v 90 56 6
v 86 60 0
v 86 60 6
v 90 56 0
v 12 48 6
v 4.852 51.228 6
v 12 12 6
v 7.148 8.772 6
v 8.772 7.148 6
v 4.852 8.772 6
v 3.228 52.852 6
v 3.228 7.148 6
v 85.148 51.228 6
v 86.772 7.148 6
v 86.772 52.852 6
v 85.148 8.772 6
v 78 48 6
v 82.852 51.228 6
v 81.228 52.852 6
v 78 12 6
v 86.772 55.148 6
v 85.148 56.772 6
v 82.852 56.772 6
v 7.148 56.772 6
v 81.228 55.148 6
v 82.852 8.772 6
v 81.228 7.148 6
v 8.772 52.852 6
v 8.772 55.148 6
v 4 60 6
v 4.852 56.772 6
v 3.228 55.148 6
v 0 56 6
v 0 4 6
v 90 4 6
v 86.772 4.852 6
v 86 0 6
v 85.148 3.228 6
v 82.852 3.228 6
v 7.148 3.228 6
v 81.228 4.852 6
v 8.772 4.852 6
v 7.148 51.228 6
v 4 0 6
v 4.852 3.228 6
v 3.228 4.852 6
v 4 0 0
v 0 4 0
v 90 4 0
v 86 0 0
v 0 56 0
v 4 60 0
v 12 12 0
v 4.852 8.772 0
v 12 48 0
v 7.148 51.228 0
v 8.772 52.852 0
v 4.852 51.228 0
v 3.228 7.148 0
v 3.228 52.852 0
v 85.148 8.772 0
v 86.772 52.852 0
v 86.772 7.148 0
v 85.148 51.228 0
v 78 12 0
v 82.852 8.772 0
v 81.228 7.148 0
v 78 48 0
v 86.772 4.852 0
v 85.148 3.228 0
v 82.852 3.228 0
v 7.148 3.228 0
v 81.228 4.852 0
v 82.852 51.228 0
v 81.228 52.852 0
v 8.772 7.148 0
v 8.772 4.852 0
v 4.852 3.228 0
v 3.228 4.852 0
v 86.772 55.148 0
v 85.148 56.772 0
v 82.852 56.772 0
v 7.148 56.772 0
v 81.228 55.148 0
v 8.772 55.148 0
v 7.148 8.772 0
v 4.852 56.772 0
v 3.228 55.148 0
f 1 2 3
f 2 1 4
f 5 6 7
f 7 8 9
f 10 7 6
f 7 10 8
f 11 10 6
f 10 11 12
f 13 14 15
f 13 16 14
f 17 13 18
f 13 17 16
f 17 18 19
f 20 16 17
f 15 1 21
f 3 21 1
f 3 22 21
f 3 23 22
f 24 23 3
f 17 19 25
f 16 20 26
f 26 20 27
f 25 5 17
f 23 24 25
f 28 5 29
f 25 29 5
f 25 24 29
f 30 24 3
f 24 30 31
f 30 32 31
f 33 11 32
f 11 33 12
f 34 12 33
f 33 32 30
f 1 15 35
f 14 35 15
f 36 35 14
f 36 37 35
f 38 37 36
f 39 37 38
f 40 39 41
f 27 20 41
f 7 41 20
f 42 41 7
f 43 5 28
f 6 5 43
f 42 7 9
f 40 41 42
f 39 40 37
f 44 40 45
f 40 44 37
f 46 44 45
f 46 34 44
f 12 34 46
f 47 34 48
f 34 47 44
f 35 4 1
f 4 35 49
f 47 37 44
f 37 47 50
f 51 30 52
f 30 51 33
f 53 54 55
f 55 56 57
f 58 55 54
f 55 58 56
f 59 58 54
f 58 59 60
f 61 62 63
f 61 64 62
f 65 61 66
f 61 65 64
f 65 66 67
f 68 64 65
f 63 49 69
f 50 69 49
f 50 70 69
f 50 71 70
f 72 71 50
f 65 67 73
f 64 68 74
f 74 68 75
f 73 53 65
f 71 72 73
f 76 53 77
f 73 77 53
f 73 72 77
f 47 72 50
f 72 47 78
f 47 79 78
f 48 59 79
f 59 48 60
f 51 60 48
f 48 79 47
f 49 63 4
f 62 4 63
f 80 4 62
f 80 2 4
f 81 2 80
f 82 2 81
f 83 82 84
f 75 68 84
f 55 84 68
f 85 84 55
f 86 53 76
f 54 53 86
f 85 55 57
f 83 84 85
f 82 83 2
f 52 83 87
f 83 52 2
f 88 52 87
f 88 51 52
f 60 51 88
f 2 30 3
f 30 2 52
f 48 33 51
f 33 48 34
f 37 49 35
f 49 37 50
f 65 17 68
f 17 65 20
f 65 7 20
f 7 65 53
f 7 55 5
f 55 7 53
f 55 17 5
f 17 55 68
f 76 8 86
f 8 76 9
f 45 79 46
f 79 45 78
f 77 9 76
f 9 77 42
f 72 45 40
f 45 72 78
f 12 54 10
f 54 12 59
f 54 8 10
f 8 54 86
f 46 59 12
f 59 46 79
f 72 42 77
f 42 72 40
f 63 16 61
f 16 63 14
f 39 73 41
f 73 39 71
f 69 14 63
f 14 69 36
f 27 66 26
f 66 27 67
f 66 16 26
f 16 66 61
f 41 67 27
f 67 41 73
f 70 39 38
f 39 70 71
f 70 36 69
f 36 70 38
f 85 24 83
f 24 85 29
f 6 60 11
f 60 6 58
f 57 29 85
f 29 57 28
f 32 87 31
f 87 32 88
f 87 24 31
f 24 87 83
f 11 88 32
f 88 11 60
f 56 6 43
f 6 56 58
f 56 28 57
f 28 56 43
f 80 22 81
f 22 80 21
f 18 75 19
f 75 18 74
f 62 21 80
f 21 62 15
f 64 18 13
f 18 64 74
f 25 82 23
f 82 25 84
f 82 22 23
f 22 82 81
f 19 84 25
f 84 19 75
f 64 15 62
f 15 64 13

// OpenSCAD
$fn = 32;

// ----------------------------------------------------------------------
// Frame plate: 90 x 60 frame, 12 mm rails
// ----------------------------------------------------------------------

// --- parameters (mm) ---
plate_l = 90;             // plate length, X
plate_w = 60;             // plate width, Y
plate_t = 6;              // plate thickness, Z (extrusion height)
corner_c = 4;             // corner chamfer
frame_bar = 12;           // frame rail width
bolt_r = 3;               // corner bolt window radius
bolt_inset = 6;           // bolt centre inset from the edges

win_l = plate_l - 2 * frame_bar;  // window length
win_w = plate_w - 2 * frame_bar;  // window width
bolt_d = 2 * bolt_r;  // corner hole diameter

profile = [[4, 0], [86, 0], [90, 4], [90, 56], [86, 60], [4, 60], [0, 56], [0, 4]];  // primary outline, 8 points, counter clockwise
void_1 = [[12, 12], [78, 12], [78, 48], [12, 48]];  // the window, 4 points
void_2 = [[8.772, 7.148], [7.148, 8.772], [4.852, 8.772], [3.228, 7.148], [3.228, 4.852], [4.852, 3.228], [7.148, 3.228], [8.772, 4.852]];  // corner bolt window, 8 points
void_3 = [[86.772, 7.148], [85.148, 8.772], [82.852, 8.772], [81.228, 7.148], [81.228, 4.852], [82.852, 3.228], [85.148, 3.228], [86.772, 4.852]];  // corner bolt window, 8 points
void_4 = [[8.772, 55.148], [7.148, 56.772], [4.852, 56.772], [3.228, 55.148], [3.228, 52.852], [4.852, 51.228], [7.148, 51.228], [8.772, 52.852]];  // corner bolt window, 8 points
void_5 = [[86.772, 55.148], [85.148, 56.772], [82.852, 56.772], [81.228, 55.148], [81.228, 52.852], [82.852, 51.228], [85.148, 51.228], [86.772, 52.852]];  // corner bolt window, 8 points

// --- the one profile operation ---
difference() {
  linear_extrude(height = plate_t) polygon(points = profile);
  translate([0, 0, -1])
    linear_extrude(height = plate_t + 2) polygon(points = void_1);
  translate([0, 0, -1])
    linear_extrude(height = plate_t + 2) polygon(points = void_2);
  translate([0, 0, -1])
    linear_extrude(height = plate_t + 2) polygon(points = void_3);
  translate([0, 0, -1])
    linear_extrude(height = plate_t + 2) polygon(points = void_4);
  translate([0, 0, -1])
    linear_extrude(height = plate_t + 2) polygon(points = void_5);
}
